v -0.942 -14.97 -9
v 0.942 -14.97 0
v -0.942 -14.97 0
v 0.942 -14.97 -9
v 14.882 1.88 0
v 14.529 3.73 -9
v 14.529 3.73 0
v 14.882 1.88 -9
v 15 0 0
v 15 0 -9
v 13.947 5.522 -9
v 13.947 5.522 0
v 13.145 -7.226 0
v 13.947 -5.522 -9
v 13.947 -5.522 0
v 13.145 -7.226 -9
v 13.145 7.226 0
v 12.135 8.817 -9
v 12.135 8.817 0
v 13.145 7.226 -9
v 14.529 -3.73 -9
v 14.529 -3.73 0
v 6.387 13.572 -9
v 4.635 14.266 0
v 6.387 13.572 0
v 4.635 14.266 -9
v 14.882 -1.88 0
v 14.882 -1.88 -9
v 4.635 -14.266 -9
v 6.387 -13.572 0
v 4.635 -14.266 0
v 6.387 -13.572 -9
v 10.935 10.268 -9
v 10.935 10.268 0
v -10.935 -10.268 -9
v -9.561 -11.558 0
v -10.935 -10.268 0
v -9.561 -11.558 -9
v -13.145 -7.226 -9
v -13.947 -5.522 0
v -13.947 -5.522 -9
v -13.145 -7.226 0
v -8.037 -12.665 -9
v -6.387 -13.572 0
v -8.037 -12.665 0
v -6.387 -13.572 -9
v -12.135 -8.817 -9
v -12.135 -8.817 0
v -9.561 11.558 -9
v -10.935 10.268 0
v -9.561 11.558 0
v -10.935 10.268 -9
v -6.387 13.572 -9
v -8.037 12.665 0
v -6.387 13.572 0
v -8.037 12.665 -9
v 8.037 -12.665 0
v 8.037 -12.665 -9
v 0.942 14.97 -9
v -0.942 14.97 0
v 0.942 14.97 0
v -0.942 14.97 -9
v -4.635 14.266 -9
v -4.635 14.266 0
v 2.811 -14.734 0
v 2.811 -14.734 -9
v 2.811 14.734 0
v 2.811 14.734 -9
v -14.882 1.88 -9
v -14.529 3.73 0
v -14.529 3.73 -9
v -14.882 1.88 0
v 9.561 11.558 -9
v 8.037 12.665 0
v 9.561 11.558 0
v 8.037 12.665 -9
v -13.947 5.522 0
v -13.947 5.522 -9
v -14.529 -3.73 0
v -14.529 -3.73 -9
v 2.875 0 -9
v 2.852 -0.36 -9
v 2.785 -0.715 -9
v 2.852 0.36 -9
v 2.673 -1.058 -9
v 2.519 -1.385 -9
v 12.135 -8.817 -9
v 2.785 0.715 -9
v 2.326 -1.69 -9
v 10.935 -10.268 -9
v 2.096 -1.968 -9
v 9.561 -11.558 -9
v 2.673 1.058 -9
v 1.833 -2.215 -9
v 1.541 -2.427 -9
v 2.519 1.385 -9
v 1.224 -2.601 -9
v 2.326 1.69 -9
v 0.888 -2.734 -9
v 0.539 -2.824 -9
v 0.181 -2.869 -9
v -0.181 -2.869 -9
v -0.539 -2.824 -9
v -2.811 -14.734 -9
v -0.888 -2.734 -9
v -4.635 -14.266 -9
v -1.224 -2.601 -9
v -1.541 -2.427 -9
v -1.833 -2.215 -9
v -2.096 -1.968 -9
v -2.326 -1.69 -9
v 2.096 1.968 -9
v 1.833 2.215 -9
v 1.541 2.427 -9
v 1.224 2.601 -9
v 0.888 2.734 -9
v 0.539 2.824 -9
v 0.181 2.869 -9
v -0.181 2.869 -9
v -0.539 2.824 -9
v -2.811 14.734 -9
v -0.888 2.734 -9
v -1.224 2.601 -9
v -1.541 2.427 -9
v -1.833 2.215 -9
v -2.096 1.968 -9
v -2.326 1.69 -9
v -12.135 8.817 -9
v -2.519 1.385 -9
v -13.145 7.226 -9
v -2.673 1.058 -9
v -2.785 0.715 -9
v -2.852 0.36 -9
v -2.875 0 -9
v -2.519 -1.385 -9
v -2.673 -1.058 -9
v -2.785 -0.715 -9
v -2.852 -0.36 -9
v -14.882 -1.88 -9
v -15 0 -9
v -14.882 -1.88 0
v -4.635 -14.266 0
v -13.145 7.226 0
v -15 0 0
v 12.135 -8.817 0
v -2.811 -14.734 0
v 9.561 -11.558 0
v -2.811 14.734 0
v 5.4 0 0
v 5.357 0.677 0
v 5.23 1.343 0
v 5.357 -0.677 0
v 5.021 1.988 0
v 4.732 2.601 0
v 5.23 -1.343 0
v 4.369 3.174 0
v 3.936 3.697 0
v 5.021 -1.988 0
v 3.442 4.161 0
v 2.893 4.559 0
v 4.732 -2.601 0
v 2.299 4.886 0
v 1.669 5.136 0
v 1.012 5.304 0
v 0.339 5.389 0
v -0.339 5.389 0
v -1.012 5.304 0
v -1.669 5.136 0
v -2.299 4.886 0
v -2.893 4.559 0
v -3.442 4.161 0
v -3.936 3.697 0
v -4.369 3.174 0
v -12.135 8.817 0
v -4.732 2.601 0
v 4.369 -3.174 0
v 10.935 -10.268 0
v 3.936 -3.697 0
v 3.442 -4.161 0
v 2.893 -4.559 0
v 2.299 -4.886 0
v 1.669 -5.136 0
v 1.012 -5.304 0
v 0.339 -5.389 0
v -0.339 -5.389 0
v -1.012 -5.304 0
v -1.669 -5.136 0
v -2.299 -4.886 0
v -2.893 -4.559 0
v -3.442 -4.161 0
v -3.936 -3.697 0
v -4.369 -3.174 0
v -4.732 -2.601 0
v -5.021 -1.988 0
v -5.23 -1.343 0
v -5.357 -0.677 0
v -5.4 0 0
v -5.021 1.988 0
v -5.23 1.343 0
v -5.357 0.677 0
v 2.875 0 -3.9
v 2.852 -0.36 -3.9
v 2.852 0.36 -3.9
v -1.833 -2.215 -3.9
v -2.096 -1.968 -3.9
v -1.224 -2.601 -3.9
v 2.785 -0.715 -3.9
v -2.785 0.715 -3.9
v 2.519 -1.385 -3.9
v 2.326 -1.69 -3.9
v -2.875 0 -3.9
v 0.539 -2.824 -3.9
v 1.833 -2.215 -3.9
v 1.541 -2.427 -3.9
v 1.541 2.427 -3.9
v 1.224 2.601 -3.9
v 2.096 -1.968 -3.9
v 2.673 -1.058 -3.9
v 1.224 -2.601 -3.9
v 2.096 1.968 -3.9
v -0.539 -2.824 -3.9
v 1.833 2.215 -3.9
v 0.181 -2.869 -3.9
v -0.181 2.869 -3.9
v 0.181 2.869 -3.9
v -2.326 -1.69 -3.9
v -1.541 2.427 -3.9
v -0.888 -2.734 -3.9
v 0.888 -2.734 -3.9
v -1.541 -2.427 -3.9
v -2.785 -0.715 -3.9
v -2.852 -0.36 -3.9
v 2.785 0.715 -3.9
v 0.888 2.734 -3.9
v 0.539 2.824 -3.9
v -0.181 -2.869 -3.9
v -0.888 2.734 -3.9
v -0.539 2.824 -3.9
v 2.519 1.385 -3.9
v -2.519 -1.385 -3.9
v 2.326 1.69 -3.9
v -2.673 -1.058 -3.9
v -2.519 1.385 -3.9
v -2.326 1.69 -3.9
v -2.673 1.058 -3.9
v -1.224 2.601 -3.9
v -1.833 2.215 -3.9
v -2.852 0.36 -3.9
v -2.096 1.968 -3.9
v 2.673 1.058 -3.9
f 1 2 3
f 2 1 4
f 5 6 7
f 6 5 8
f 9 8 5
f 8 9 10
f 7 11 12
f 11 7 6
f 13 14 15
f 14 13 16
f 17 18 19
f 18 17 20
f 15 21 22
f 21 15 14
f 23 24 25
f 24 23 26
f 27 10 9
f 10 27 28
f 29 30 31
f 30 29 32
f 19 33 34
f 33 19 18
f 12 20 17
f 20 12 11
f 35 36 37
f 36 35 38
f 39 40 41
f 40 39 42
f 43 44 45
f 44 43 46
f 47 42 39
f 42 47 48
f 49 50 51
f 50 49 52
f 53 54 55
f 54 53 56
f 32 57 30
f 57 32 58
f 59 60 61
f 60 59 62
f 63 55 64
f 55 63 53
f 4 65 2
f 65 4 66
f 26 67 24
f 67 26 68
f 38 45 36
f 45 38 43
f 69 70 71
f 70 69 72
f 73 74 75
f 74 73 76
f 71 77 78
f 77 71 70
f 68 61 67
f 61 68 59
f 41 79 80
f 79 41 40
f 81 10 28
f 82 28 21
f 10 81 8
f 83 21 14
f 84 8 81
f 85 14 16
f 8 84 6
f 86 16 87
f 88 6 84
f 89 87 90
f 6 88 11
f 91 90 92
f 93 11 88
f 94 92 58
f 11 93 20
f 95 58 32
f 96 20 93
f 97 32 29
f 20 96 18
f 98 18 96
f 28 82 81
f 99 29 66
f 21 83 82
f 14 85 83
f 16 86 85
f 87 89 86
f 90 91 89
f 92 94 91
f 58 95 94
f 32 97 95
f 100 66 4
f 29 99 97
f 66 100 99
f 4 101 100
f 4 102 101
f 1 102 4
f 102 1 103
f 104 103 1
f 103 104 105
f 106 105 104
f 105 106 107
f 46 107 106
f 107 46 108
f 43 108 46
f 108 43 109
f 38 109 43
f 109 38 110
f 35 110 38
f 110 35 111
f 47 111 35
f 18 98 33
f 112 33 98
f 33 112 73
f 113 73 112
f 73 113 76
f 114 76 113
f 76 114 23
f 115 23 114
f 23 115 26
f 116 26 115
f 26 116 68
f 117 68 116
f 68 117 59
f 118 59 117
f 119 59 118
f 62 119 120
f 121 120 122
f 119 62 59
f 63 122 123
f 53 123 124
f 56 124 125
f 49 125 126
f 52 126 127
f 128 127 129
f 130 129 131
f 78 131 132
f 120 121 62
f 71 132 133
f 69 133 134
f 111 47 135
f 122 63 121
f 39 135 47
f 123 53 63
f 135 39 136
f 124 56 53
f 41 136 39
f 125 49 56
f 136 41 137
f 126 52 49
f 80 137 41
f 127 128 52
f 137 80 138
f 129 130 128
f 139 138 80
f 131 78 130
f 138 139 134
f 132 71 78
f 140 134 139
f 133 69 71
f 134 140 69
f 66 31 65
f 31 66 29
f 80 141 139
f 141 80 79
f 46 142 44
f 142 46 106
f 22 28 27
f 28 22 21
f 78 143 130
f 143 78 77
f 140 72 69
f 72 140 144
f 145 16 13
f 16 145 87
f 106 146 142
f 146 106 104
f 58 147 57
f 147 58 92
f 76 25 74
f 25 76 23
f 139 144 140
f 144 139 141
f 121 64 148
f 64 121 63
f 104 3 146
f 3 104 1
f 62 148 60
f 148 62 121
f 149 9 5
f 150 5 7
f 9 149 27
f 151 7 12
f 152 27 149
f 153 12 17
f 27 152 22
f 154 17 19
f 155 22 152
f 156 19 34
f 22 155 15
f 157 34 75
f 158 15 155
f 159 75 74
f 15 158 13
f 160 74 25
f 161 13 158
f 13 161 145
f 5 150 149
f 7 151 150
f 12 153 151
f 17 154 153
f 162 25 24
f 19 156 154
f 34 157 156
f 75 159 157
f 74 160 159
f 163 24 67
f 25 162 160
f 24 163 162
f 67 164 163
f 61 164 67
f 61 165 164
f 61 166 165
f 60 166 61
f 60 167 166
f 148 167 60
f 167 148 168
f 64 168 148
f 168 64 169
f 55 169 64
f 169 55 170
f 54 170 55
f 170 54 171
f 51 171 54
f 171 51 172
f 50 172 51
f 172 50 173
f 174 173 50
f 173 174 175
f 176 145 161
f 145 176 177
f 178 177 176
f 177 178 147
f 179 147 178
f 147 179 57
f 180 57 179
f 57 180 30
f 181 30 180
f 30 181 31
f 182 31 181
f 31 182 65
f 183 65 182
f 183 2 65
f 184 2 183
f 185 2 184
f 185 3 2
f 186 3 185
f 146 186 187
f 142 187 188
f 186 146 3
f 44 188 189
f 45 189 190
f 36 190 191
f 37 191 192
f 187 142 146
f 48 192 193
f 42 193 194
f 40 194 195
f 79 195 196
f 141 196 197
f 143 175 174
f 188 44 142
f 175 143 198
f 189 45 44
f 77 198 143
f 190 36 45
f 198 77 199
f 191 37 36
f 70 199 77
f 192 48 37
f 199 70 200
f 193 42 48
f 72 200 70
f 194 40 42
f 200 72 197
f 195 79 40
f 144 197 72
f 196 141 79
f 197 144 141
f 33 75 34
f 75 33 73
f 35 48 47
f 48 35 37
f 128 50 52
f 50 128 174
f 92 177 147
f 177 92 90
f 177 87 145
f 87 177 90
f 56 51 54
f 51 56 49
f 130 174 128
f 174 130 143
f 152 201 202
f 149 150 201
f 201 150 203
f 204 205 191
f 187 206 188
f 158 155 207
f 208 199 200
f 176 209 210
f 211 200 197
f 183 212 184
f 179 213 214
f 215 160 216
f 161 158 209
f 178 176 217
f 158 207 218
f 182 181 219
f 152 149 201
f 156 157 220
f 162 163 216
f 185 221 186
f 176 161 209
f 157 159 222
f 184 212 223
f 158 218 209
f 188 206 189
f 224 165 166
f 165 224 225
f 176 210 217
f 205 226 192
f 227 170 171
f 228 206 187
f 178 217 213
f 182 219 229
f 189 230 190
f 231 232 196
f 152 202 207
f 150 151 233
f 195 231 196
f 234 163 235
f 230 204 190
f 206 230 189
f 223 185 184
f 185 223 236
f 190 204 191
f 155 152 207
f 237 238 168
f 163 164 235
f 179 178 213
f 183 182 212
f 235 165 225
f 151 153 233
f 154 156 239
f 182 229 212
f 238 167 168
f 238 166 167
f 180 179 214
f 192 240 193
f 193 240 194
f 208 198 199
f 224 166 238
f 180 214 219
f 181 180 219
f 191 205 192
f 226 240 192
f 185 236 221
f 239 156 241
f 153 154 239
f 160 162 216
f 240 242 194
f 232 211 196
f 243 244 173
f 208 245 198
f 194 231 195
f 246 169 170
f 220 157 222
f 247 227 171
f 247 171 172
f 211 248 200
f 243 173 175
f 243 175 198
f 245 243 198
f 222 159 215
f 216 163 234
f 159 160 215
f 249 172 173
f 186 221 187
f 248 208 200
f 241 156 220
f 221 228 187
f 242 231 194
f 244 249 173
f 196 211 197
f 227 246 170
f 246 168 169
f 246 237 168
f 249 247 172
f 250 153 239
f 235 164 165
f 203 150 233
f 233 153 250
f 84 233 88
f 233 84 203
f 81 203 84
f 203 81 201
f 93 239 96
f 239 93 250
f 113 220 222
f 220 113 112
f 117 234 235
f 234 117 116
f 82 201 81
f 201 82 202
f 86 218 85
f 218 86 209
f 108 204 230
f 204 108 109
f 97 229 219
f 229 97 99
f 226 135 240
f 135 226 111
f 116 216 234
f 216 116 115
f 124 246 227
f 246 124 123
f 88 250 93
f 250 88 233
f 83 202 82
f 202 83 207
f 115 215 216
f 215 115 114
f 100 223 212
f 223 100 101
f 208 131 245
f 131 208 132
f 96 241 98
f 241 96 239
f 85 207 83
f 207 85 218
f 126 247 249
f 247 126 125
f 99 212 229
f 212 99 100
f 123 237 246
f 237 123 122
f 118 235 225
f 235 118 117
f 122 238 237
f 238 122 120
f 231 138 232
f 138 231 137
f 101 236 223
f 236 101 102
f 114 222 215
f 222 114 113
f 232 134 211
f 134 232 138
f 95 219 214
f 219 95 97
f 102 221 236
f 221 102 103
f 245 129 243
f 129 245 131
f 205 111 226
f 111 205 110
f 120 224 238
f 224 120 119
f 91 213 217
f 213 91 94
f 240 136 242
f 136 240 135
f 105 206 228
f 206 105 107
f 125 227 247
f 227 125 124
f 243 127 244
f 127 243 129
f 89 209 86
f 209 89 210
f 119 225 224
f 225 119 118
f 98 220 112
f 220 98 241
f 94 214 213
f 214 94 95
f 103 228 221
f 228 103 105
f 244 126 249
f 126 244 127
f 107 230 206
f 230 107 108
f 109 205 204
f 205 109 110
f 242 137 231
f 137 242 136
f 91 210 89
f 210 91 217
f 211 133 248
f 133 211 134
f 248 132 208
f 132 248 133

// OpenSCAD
$fn = 50;


difference() {
	union() {
		translate(v = [0, 0, -9.0000000000]) {
			cylinder(h = 9, r = 15.0000000000);
		}
		translate(v = [0, 0, -9.0000000000]) {
			cylinder(h = 9, r = 2.8750000000);
		}
	}
	union() {
		translate(v = [0, 0, 0]) {
			rotate(a = [0, 0, 0]) {
				difference() {
					union() {
						translate(v = [0, 0, -9.0000000000]) {
							cylinder(h = 9, r = 2.6000000000);
						}
						translate(v = [0, 0, -3.9000000000]) {
							cylinder(h = 3.9000000000, r1 = 2.8750000000, r2 = 5.4000000000);
						}
						translate(v = [0, 0, -9.0000000000]) {
							cylinder(h = 9, r = 2.8750000000);
						}
						translate(v = [0, 0, -9.0000000000]) {
							cylinder(h = 9, r = 2.6000000000);
						}
					}
					union();
				}
			}
		}
	}
}
